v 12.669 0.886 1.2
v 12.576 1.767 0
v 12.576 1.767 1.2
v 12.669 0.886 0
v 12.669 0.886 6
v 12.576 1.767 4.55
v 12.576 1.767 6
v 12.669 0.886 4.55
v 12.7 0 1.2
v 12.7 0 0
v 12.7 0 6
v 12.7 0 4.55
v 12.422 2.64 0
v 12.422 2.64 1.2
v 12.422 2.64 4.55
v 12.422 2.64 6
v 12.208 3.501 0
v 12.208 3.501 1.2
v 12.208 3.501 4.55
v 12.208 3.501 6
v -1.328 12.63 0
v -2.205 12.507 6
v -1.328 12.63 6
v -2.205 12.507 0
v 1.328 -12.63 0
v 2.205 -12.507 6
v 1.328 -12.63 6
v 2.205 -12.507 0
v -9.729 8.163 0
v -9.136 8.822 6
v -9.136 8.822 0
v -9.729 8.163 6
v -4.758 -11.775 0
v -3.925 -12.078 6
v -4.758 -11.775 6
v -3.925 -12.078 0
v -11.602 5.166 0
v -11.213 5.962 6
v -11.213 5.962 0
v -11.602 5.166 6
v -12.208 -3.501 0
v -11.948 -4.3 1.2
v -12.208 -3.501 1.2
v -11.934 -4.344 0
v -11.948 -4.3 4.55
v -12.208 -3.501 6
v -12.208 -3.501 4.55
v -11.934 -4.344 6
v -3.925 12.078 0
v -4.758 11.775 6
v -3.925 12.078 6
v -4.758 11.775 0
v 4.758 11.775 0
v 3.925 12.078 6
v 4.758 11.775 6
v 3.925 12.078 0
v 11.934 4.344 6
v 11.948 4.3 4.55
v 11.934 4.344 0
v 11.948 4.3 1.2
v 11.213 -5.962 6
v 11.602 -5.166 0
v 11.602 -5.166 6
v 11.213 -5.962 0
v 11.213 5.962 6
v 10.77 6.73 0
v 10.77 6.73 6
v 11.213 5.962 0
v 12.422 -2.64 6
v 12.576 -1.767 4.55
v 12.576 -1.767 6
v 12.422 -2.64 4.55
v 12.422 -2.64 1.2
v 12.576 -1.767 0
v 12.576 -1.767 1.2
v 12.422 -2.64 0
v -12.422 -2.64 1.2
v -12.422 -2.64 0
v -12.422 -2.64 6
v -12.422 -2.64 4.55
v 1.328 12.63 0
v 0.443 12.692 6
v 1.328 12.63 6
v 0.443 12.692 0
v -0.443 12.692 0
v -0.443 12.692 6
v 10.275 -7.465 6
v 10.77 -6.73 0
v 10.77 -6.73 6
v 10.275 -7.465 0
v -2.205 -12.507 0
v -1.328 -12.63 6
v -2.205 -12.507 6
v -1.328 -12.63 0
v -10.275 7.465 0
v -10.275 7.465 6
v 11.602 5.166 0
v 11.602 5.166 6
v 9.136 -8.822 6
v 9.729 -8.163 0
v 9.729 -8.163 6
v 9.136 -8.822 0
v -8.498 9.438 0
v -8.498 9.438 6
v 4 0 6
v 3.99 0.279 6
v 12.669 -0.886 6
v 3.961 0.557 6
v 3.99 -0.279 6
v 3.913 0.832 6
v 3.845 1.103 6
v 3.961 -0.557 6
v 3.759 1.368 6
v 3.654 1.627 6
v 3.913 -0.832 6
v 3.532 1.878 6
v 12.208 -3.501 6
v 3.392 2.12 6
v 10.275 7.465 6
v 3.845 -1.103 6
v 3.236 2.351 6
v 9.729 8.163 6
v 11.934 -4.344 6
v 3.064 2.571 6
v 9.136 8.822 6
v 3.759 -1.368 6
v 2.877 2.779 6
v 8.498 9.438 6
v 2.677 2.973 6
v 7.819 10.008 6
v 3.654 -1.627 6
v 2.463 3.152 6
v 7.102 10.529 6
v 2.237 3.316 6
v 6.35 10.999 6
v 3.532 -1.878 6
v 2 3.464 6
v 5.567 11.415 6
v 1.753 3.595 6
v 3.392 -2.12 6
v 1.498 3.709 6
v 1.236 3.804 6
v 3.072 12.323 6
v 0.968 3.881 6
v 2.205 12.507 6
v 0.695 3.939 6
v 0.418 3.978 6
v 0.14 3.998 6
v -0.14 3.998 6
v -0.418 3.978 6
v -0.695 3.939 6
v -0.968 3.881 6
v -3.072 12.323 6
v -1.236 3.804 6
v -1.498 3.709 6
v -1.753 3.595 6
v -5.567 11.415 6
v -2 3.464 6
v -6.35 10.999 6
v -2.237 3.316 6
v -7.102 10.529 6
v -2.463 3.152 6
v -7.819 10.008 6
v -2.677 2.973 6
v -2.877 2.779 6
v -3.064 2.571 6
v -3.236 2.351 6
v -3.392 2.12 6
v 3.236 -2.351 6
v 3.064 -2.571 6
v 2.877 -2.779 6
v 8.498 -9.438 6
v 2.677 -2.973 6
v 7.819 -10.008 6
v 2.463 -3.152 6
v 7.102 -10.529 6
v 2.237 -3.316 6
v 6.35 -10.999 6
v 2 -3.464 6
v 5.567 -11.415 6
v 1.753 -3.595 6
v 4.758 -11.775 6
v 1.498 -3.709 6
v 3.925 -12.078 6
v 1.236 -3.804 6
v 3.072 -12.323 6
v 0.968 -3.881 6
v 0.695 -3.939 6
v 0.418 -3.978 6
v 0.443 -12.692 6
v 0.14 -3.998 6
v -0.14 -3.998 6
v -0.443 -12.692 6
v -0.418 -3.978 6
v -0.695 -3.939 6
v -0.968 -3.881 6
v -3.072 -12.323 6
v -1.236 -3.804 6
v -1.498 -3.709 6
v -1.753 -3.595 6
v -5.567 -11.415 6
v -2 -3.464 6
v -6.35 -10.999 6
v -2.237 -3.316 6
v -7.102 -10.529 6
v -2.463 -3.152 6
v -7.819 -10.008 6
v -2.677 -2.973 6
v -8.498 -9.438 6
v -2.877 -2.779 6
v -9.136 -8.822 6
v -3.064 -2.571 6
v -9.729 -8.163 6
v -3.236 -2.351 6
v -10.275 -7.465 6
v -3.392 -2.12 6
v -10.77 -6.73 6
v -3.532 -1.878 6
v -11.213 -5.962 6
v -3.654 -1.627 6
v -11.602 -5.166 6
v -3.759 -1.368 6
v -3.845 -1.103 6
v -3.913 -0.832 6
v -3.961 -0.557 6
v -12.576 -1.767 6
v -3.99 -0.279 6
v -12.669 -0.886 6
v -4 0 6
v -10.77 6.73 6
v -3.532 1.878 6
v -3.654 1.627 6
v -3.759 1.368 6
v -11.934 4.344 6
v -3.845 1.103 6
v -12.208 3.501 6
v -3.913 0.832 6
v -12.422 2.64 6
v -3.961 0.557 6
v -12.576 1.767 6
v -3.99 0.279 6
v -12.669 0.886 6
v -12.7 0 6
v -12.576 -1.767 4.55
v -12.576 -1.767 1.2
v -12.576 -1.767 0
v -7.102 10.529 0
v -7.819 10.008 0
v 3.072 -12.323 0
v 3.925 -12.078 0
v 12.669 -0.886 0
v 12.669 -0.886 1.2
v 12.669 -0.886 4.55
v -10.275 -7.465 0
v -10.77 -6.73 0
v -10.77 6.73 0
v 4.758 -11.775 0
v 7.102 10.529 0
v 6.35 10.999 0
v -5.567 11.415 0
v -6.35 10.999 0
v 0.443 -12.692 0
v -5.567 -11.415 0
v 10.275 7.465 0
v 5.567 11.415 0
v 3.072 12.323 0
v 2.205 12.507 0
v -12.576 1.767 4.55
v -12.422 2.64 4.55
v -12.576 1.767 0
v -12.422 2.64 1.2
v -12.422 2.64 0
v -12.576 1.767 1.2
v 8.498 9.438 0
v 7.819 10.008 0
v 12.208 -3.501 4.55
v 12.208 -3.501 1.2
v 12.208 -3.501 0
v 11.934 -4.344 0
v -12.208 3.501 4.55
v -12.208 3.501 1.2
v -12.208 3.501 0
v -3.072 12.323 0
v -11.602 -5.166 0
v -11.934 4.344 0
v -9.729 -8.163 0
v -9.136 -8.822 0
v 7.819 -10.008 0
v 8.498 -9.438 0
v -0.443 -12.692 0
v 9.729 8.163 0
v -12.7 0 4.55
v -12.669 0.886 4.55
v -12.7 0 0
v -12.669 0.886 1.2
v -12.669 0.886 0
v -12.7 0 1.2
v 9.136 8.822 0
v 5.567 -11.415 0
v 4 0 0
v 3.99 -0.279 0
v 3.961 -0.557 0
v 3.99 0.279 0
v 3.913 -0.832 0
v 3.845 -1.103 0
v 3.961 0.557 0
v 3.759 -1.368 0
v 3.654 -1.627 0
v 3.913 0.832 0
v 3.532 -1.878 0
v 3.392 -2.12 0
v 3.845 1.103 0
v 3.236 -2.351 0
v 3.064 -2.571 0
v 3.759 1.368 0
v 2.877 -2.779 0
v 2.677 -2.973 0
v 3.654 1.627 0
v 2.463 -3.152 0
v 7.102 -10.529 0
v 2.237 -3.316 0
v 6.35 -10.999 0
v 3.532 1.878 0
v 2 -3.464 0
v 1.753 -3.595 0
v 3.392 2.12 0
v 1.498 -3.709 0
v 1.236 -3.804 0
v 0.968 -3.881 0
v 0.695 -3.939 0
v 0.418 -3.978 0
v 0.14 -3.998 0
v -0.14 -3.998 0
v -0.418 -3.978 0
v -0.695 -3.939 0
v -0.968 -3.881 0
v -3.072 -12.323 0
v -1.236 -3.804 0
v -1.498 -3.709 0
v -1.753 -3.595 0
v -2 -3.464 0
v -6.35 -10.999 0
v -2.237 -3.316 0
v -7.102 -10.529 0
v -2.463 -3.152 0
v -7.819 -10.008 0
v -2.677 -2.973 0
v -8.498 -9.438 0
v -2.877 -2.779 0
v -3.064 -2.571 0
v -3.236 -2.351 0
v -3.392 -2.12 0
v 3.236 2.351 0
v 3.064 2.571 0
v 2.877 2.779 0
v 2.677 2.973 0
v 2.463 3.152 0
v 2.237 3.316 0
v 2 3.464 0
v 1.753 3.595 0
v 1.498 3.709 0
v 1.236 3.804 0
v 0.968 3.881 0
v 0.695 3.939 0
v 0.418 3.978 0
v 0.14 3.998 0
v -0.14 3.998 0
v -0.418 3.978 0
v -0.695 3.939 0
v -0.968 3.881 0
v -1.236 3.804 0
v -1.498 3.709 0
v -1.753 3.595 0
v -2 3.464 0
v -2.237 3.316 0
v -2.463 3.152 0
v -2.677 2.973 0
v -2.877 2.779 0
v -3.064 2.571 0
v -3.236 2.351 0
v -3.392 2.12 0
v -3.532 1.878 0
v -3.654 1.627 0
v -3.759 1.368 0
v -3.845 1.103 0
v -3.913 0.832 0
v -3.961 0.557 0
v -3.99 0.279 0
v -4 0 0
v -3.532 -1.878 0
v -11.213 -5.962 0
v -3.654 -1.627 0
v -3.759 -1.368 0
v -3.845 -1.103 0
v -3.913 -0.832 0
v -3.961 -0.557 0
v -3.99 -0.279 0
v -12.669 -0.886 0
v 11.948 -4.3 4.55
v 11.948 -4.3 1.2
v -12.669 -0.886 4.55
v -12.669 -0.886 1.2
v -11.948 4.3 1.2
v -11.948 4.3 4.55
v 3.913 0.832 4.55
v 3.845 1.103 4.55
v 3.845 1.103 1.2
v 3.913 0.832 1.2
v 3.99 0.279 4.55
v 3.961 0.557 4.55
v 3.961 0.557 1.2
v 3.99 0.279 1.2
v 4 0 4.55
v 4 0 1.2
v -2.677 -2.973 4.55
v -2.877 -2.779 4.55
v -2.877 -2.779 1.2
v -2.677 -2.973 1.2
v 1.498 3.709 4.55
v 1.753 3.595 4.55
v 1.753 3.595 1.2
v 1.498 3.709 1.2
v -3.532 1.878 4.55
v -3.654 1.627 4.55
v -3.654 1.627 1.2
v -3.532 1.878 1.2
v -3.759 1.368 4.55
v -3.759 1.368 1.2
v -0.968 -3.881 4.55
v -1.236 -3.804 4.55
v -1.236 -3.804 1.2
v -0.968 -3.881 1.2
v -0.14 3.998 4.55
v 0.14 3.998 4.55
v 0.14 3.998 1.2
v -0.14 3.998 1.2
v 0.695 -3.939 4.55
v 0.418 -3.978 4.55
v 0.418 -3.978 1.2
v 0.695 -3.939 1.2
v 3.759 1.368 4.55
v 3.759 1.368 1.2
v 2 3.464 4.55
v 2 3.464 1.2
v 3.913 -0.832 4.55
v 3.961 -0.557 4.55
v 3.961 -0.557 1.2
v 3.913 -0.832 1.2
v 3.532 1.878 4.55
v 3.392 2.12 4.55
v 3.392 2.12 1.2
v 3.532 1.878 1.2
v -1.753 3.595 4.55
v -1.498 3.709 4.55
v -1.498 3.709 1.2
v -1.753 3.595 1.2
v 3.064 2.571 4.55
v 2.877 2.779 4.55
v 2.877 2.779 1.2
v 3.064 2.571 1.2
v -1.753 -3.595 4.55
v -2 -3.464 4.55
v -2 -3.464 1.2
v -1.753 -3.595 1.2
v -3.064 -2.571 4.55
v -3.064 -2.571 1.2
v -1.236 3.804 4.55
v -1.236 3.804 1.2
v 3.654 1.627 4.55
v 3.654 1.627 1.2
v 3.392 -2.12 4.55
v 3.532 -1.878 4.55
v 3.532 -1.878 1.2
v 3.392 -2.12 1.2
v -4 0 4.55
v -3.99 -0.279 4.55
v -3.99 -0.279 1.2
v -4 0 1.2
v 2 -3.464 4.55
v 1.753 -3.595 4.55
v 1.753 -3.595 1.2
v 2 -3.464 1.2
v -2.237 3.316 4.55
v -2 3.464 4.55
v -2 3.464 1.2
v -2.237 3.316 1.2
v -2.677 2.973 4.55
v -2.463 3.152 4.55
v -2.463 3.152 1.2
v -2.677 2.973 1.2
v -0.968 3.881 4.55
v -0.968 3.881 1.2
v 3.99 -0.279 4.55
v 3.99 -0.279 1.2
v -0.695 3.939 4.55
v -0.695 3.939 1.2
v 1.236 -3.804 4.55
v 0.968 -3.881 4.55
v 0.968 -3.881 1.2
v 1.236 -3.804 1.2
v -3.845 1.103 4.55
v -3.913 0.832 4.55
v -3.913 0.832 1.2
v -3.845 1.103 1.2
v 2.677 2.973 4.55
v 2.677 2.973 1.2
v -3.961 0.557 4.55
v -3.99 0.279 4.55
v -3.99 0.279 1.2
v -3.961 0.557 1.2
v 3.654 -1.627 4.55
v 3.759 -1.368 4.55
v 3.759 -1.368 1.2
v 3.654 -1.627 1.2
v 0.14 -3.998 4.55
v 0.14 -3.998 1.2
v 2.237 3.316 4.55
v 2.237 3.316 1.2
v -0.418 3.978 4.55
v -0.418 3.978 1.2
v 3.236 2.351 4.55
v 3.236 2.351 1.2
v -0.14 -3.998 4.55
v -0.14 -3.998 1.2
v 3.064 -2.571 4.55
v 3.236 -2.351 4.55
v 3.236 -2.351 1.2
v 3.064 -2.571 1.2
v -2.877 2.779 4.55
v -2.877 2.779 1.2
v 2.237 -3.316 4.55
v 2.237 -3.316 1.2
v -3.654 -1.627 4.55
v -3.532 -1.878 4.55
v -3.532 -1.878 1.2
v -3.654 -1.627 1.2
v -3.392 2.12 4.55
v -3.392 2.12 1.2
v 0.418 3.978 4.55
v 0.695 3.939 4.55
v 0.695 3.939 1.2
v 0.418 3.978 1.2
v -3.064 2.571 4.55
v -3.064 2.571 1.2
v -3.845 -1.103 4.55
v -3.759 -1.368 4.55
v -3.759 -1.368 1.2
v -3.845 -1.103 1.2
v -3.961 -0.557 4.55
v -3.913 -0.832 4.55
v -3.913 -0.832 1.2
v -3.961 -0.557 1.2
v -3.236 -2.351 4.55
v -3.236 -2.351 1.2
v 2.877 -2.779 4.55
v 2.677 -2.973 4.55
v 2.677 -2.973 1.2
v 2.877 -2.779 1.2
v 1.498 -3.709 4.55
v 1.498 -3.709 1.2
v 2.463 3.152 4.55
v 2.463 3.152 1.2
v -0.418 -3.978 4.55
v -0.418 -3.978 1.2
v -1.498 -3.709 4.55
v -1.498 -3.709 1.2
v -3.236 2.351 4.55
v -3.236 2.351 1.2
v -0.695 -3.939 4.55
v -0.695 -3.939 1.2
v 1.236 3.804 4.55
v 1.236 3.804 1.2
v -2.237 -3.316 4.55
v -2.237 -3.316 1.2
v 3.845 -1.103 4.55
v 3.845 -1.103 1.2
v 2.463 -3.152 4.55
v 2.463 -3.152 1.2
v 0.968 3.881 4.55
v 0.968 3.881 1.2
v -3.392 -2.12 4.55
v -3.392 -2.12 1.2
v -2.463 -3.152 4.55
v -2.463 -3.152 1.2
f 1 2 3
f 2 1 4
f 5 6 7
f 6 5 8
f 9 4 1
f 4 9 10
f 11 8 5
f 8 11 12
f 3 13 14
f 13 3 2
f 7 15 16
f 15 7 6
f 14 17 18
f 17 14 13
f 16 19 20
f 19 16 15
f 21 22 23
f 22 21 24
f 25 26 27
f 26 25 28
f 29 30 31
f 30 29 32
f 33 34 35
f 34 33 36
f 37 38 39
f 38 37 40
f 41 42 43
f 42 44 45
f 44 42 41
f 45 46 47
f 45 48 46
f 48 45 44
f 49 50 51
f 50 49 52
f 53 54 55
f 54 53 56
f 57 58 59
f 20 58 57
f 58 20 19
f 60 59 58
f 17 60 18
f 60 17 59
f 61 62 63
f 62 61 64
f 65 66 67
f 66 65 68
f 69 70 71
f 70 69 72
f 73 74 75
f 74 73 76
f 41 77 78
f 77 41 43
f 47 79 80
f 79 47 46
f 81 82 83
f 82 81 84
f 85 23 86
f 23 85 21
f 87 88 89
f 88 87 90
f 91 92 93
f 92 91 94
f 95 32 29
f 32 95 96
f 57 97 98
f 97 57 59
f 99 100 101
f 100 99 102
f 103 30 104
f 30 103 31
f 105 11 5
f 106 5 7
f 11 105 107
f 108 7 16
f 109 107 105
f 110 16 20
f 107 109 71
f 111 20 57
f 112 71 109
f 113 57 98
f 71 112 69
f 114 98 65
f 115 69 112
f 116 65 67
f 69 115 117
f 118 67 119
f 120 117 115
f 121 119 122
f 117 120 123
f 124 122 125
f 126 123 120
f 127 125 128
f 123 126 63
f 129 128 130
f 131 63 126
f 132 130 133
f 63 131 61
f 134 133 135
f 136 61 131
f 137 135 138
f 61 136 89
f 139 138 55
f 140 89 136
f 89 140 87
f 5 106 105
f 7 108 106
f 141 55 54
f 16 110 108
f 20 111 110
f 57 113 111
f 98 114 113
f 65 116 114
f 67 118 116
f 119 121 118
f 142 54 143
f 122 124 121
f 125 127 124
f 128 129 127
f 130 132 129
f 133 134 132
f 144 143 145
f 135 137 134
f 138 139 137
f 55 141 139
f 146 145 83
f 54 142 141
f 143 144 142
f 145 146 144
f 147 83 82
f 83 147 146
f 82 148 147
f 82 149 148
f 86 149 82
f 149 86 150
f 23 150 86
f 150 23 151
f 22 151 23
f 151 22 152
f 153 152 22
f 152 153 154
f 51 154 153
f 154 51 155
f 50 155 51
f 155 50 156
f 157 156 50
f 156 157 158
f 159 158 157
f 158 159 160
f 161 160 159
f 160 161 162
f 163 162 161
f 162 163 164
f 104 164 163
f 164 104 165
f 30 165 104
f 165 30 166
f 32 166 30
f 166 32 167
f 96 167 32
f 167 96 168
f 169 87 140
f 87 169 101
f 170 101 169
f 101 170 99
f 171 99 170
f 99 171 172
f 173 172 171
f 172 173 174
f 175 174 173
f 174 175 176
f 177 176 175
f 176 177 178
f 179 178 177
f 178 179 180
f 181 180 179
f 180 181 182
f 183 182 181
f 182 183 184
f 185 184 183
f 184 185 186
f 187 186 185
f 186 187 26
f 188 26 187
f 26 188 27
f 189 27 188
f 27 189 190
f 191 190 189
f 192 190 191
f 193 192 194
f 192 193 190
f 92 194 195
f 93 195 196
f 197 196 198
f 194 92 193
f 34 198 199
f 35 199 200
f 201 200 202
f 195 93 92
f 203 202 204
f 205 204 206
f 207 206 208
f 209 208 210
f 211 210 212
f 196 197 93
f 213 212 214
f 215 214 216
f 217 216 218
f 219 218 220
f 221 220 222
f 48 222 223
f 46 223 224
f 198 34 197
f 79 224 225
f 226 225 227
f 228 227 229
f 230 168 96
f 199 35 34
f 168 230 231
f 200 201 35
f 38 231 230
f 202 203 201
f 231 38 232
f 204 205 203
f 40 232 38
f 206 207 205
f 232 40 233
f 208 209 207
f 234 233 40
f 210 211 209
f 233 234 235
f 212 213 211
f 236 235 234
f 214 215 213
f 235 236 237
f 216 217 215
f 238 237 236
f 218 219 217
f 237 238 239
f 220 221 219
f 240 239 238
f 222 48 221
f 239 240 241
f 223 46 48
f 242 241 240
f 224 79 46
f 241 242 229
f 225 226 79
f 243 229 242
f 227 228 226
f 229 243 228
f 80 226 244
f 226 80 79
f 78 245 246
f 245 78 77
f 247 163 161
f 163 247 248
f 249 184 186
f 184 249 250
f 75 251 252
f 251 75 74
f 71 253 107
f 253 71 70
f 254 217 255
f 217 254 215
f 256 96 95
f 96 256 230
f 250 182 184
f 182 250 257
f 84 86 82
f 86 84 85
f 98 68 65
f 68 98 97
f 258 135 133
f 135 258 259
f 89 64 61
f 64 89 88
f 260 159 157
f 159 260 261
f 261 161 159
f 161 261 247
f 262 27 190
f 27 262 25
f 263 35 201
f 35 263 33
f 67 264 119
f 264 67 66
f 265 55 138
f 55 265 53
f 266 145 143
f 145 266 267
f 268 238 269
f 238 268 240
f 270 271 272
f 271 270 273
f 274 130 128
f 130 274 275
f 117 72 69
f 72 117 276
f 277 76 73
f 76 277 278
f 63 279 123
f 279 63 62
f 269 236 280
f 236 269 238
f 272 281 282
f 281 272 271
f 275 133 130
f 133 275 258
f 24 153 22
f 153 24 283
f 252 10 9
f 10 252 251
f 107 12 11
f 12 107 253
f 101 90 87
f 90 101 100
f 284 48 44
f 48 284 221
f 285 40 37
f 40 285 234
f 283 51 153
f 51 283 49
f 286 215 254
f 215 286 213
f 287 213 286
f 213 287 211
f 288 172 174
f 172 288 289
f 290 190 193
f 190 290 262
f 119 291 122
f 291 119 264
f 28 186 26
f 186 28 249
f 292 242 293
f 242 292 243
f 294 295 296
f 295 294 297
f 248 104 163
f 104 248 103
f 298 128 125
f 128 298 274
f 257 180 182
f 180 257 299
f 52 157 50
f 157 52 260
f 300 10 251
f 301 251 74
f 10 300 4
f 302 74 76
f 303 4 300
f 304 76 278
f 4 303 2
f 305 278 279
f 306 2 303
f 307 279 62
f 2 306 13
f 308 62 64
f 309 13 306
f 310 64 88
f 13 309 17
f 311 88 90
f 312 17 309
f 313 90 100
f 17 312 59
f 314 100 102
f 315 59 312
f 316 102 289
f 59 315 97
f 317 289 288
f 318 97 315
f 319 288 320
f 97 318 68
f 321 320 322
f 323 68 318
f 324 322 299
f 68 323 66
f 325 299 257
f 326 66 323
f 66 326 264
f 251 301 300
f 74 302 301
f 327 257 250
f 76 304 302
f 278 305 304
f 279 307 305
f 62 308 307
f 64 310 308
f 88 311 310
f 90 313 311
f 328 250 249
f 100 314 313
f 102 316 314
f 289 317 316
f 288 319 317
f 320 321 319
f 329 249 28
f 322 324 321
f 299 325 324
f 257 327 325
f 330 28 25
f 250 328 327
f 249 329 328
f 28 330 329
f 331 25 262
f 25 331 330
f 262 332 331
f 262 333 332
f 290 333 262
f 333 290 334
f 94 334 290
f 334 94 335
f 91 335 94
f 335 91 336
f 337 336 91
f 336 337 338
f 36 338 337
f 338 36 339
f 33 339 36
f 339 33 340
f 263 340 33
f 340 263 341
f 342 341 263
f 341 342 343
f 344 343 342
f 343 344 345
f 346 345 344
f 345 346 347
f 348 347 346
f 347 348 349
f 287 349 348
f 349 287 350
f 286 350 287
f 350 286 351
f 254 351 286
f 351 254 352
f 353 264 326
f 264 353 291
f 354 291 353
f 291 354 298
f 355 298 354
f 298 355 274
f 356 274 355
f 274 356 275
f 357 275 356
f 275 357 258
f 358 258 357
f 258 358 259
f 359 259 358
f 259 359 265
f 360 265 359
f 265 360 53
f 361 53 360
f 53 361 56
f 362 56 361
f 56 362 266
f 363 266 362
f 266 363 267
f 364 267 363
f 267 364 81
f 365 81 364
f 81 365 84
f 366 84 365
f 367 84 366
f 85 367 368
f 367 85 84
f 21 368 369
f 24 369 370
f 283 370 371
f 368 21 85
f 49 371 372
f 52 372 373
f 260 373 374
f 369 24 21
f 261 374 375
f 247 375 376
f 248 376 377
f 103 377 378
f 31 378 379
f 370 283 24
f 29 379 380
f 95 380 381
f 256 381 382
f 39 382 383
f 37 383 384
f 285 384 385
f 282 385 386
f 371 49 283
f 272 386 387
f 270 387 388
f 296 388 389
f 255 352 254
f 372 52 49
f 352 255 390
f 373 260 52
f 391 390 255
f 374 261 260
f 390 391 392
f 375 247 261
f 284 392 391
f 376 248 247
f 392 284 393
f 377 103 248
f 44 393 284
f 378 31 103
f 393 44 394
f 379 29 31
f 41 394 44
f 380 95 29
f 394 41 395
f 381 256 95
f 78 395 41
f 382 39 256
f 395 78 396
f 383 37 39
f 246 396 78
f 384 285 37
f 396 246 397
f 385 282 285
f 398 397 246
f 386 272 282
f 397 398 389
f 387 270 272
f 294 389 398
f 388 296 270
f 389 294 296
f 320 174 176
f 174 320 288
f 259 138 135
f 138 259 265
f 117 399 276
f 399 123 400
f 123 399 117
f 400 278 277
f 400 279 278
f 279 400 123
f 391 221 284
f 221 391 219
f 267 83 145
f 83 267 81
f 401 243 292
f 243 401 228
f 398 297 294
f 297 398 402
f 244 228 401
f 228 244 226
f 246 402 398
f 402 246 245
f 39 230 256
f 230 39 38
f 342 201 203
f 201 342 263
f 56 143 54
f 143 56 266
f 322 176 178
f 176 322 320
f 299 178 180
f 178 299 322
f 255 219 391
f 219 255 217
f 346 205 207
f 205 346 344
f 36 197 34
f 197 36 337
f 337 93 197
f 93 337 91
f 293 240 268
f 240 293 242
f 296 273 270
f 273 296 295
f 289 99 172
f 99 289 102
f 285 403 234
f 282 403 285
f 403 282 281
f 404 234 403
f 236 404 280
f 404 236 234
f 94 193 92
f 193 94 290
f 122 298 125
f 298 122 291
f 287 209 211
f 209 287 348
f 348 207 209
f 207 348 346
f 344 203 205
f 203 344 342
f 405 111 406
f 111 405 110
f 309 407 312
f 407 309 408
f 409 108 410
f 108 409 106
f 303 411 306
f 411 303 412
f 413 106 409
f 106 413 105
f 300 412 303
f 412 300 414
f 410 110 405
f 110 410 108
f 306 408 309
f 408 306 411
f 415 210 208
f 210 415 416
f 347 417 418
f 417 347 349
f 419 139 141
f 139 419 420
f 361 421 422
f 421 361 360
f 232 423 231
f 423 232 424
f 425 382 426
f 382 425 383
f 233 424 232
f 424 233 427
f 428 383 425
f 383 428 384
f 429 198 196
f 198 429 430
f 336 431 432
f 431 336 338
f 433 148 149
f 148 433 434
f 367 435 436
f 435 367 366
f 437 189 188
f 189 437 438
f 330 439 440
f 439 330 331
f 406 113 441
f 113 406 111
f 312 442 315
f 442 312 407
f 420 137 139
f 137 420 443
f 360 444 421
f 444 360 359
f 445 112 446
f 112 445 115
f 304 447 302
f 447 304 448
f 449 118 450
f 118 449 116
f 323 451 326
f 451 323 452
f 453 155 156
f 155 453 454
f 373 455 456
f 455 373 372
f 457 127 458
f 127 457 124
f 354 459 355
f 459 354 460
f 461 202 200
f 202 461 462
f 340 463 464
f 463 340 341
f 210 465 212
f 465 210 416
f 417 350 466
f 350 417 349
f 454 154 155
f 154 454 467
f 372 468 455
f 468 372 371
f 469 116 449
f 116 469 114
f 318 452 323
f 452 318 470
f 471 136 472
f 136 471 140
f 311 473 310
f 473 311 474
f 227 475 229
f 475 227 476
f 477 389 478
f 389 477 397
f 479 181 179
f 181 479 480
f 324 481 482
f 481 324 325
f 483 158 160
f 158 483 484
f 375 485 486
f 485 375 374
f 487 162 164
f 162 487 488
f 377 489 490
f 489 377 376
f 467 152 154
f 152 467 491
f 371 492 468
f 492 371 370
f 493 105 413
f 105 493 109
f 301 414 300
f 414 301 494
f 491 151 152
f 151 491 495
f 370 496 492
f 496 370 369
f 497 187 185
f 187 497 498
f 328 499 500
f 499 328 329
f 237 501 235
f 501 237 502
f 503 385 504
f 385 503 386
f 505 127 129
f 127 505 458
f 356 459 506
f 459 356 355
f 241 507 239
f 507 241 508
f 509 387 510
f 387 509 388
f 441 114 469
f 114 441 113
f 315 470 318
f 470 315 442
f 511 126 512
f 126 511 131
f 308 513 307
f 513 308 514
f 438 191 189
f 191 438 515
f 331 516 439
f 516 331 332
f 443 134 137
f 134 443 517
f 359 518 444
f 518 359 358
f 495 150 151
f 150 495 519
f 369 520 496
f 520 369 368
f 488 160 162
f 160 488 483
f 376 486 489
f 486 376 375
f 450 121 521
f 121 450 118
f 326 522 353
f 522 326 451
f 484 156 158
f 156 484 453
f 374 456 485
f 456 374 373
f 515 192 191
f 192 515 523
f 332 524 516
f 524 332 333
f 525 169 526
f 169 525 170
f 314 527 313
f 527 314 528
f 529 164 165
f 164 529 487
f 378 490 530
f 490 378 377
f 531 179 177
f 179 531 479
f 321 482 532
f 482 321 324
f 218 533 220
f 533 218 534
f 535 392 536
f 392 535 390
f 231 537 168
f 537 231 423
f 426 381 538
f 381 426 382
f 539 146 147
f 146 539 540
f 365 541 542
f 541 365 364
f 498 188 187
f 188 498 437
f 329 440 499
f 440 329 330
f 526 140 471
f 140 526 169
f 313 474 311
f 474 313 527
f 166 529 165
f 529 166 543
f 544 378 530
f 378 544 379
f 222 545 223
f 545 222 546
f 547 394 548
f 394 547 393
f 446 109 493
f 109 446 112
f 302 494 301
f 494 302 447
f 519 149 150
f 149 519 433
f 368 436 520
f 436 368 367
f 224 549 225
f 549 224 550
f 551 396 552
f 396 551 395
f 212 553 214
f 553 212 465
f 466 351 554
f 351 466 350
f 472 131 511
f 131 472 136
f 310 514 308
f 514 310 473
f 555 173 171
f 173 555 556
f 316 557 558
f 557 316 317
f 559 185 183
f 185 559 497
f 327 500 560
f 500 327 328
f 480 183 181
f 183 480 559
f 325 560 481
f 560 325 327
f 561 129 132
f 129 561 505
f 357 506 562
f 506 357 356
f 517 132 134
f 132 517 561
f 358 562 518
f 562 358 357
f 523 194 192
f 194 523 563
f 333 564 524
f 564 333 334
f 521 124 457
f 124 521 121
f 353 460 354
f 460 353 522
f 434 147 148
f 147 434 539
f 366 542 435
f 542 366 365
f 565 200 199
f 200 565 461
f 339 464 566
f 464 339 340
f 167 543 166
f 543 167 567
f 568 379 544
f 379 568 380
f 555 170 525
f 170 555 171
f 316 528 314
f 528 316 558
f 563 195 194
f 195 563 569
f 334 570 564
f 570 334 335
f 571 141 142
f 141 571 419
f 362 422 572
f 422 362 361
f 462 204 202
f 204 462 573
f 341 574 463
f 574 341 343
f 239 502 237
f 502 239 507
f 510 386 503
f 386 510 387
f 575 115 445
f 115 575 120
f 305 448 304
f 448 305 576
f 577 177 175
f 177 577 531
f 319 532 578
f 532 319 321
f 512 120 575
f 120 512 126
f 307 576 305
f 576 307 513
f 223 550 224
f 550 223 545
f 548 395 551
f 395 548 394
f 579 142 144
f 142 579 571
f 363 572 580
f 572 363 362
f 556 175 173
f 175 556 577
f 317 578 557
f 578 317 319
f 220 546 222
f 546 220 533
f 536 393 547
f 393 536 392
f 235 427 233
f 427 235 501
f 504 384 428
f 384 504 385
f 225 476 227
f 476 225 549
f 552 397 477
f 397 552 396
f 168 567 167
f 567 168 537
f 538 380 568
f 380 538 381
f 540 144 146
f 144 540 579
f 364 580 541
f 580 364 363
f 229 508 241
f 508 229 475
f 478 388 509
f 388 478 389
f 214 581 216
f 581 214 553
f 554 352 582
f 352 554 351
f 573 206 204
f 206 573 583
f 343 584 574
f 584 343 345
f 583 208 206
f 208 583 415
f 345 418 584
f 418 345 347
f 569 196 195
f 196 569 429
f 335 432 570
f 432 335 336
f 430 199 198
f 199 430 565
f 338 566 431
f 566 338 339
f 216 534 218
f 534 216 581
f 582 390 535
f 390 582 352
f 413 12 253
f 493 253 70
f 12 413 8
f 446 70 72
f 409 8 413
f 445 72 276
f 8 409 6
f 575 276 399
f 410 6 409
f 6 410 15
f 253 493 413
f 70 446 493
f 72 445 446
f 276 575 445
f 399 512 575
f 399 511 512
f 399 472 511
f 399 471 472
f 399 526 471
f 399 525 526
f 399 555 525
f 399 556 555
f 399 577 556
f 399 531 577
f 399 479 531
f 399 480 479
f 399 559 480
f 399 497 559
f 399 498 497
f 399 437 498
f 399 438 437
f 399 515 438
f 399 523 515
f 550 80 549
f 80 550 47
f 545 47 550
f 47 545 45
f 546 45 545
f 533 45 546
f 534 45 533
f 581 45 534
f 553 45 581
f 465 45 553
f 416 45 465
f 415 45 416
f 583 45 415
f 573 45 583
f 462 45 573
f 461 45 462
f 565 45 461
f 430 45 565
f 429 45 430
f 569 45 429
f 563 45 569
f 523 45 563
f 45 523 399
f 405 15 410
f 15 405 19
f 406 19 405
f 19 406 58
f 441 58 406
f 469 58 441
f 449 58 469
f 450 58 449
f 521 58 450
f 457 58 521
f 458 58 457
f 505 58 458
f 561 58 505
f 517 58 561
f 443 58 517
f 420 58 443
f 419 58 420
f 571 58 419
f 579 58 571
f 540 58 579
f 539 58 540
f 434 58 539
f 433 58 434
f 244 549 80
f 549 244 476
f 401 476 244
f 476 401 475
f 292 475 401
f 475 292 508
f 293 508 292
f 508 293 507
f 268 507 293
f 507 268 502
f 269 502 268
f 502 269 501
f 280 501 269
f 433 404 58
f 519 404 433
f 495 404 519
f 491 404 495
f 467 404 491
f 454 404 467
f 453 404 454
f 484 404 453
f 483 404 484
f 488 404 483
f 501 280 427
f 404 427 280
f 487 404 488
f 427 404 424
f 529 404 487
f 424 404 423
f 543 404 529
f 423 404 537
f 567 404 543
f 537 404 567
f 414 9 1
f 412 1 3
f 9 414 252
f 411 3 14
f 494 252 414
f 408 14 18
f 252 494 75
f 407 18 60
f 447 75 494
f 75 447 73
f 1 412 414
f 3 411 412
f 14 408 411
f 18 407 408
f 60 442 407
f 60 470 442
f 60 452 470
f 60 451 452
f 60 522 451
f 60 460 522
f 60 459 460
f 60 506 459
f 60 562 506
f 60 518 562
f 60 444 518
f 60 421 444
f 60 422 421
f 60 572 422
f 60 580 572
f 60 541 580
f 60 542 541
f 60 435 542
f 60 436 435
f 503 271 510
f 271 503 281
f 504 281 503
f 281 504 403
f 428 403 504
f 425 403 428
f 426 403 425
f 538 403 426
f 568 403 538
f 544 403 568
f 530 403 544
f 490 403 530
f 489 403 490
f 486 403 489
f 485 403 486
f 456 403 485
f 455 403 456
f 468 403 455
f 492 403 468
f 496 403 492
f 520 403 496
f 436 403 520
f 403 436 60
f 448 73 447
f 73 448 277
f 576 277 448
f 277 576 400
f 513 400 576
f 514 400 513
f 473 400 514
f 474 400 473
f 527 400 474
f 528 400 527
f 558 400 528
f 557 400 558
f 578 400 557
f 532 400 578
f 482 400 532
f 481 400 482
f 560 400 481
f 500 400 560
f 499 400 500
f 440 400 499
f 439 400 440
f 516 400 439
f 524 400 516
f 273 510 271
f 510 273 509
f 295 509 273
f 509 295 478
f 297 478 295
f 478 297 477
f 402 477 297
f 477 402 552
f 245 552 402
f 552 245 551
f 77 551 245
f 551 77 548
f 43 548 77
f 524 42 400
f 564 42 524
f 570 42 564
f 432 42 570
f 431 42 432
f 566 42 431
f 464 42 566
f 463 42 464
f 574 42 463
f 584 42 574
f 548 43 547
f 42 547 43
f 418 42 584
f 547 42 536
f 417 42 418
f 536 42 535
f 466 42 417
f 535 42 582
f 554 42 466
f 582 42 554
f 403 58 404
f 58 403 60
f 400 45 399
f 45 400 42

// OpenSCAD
inch = 25.4;

// original reads came back as 1/4 inch (wrong part of the caliper)
// then it measured 7.5 mm
// the inside seems to shrink significantly during printing, though
axle_d = 8;

wheel_d = inch/2;
wheel_w = inch * 1.5;

cap_d = inch;
cap_w = 6;

inset_d = inch*3/16;
inset_w = 2.75;
end_w = 1.5;

pin_tol = 0.3;
overshot = 0.1;

$fn = 90;

module bearing() {
  difference () {
    cylinder(d=wheel_d, h=wheel_w);
    translate([0,0,-overshot]) cylinder(d=axle_d, h=wheel_w + 2*overshot);
  }
}

module cap() {
  difference () {
    cylinder(d=cap_d, h=cap_w);
    translate([0,0,-overshot]) cylinder(d=axle_d, h=cap_w + 2*overshot);
    translate([-cap_d/2,-axle_d/2-pin_tol,end_w-pin_tol]) cube([cap_d,axle_d+2*pin_tol,inset_w+2*pin_tol]);
  }
}

module pin() {
  intersection() {
    difference() {
      cylinder(d=cap_d, h=inset_w);
      translate([0,0,-overshot]) cylinder(d=inset_d, h=inset_w + 2*overshot);
      translate([0,-inset_d/2,-overshot]) cube([cap_d/2,inset_d,inset_w+2*overshot]);
    }
    translate([-cap_d/2,-axle_d/2,0]) cube([cap_d,axle_d,inset_w]);
  }
}
cap();
/*translate([0,0,end_w]) color("yellow")*/ //pin();
//bearing();
